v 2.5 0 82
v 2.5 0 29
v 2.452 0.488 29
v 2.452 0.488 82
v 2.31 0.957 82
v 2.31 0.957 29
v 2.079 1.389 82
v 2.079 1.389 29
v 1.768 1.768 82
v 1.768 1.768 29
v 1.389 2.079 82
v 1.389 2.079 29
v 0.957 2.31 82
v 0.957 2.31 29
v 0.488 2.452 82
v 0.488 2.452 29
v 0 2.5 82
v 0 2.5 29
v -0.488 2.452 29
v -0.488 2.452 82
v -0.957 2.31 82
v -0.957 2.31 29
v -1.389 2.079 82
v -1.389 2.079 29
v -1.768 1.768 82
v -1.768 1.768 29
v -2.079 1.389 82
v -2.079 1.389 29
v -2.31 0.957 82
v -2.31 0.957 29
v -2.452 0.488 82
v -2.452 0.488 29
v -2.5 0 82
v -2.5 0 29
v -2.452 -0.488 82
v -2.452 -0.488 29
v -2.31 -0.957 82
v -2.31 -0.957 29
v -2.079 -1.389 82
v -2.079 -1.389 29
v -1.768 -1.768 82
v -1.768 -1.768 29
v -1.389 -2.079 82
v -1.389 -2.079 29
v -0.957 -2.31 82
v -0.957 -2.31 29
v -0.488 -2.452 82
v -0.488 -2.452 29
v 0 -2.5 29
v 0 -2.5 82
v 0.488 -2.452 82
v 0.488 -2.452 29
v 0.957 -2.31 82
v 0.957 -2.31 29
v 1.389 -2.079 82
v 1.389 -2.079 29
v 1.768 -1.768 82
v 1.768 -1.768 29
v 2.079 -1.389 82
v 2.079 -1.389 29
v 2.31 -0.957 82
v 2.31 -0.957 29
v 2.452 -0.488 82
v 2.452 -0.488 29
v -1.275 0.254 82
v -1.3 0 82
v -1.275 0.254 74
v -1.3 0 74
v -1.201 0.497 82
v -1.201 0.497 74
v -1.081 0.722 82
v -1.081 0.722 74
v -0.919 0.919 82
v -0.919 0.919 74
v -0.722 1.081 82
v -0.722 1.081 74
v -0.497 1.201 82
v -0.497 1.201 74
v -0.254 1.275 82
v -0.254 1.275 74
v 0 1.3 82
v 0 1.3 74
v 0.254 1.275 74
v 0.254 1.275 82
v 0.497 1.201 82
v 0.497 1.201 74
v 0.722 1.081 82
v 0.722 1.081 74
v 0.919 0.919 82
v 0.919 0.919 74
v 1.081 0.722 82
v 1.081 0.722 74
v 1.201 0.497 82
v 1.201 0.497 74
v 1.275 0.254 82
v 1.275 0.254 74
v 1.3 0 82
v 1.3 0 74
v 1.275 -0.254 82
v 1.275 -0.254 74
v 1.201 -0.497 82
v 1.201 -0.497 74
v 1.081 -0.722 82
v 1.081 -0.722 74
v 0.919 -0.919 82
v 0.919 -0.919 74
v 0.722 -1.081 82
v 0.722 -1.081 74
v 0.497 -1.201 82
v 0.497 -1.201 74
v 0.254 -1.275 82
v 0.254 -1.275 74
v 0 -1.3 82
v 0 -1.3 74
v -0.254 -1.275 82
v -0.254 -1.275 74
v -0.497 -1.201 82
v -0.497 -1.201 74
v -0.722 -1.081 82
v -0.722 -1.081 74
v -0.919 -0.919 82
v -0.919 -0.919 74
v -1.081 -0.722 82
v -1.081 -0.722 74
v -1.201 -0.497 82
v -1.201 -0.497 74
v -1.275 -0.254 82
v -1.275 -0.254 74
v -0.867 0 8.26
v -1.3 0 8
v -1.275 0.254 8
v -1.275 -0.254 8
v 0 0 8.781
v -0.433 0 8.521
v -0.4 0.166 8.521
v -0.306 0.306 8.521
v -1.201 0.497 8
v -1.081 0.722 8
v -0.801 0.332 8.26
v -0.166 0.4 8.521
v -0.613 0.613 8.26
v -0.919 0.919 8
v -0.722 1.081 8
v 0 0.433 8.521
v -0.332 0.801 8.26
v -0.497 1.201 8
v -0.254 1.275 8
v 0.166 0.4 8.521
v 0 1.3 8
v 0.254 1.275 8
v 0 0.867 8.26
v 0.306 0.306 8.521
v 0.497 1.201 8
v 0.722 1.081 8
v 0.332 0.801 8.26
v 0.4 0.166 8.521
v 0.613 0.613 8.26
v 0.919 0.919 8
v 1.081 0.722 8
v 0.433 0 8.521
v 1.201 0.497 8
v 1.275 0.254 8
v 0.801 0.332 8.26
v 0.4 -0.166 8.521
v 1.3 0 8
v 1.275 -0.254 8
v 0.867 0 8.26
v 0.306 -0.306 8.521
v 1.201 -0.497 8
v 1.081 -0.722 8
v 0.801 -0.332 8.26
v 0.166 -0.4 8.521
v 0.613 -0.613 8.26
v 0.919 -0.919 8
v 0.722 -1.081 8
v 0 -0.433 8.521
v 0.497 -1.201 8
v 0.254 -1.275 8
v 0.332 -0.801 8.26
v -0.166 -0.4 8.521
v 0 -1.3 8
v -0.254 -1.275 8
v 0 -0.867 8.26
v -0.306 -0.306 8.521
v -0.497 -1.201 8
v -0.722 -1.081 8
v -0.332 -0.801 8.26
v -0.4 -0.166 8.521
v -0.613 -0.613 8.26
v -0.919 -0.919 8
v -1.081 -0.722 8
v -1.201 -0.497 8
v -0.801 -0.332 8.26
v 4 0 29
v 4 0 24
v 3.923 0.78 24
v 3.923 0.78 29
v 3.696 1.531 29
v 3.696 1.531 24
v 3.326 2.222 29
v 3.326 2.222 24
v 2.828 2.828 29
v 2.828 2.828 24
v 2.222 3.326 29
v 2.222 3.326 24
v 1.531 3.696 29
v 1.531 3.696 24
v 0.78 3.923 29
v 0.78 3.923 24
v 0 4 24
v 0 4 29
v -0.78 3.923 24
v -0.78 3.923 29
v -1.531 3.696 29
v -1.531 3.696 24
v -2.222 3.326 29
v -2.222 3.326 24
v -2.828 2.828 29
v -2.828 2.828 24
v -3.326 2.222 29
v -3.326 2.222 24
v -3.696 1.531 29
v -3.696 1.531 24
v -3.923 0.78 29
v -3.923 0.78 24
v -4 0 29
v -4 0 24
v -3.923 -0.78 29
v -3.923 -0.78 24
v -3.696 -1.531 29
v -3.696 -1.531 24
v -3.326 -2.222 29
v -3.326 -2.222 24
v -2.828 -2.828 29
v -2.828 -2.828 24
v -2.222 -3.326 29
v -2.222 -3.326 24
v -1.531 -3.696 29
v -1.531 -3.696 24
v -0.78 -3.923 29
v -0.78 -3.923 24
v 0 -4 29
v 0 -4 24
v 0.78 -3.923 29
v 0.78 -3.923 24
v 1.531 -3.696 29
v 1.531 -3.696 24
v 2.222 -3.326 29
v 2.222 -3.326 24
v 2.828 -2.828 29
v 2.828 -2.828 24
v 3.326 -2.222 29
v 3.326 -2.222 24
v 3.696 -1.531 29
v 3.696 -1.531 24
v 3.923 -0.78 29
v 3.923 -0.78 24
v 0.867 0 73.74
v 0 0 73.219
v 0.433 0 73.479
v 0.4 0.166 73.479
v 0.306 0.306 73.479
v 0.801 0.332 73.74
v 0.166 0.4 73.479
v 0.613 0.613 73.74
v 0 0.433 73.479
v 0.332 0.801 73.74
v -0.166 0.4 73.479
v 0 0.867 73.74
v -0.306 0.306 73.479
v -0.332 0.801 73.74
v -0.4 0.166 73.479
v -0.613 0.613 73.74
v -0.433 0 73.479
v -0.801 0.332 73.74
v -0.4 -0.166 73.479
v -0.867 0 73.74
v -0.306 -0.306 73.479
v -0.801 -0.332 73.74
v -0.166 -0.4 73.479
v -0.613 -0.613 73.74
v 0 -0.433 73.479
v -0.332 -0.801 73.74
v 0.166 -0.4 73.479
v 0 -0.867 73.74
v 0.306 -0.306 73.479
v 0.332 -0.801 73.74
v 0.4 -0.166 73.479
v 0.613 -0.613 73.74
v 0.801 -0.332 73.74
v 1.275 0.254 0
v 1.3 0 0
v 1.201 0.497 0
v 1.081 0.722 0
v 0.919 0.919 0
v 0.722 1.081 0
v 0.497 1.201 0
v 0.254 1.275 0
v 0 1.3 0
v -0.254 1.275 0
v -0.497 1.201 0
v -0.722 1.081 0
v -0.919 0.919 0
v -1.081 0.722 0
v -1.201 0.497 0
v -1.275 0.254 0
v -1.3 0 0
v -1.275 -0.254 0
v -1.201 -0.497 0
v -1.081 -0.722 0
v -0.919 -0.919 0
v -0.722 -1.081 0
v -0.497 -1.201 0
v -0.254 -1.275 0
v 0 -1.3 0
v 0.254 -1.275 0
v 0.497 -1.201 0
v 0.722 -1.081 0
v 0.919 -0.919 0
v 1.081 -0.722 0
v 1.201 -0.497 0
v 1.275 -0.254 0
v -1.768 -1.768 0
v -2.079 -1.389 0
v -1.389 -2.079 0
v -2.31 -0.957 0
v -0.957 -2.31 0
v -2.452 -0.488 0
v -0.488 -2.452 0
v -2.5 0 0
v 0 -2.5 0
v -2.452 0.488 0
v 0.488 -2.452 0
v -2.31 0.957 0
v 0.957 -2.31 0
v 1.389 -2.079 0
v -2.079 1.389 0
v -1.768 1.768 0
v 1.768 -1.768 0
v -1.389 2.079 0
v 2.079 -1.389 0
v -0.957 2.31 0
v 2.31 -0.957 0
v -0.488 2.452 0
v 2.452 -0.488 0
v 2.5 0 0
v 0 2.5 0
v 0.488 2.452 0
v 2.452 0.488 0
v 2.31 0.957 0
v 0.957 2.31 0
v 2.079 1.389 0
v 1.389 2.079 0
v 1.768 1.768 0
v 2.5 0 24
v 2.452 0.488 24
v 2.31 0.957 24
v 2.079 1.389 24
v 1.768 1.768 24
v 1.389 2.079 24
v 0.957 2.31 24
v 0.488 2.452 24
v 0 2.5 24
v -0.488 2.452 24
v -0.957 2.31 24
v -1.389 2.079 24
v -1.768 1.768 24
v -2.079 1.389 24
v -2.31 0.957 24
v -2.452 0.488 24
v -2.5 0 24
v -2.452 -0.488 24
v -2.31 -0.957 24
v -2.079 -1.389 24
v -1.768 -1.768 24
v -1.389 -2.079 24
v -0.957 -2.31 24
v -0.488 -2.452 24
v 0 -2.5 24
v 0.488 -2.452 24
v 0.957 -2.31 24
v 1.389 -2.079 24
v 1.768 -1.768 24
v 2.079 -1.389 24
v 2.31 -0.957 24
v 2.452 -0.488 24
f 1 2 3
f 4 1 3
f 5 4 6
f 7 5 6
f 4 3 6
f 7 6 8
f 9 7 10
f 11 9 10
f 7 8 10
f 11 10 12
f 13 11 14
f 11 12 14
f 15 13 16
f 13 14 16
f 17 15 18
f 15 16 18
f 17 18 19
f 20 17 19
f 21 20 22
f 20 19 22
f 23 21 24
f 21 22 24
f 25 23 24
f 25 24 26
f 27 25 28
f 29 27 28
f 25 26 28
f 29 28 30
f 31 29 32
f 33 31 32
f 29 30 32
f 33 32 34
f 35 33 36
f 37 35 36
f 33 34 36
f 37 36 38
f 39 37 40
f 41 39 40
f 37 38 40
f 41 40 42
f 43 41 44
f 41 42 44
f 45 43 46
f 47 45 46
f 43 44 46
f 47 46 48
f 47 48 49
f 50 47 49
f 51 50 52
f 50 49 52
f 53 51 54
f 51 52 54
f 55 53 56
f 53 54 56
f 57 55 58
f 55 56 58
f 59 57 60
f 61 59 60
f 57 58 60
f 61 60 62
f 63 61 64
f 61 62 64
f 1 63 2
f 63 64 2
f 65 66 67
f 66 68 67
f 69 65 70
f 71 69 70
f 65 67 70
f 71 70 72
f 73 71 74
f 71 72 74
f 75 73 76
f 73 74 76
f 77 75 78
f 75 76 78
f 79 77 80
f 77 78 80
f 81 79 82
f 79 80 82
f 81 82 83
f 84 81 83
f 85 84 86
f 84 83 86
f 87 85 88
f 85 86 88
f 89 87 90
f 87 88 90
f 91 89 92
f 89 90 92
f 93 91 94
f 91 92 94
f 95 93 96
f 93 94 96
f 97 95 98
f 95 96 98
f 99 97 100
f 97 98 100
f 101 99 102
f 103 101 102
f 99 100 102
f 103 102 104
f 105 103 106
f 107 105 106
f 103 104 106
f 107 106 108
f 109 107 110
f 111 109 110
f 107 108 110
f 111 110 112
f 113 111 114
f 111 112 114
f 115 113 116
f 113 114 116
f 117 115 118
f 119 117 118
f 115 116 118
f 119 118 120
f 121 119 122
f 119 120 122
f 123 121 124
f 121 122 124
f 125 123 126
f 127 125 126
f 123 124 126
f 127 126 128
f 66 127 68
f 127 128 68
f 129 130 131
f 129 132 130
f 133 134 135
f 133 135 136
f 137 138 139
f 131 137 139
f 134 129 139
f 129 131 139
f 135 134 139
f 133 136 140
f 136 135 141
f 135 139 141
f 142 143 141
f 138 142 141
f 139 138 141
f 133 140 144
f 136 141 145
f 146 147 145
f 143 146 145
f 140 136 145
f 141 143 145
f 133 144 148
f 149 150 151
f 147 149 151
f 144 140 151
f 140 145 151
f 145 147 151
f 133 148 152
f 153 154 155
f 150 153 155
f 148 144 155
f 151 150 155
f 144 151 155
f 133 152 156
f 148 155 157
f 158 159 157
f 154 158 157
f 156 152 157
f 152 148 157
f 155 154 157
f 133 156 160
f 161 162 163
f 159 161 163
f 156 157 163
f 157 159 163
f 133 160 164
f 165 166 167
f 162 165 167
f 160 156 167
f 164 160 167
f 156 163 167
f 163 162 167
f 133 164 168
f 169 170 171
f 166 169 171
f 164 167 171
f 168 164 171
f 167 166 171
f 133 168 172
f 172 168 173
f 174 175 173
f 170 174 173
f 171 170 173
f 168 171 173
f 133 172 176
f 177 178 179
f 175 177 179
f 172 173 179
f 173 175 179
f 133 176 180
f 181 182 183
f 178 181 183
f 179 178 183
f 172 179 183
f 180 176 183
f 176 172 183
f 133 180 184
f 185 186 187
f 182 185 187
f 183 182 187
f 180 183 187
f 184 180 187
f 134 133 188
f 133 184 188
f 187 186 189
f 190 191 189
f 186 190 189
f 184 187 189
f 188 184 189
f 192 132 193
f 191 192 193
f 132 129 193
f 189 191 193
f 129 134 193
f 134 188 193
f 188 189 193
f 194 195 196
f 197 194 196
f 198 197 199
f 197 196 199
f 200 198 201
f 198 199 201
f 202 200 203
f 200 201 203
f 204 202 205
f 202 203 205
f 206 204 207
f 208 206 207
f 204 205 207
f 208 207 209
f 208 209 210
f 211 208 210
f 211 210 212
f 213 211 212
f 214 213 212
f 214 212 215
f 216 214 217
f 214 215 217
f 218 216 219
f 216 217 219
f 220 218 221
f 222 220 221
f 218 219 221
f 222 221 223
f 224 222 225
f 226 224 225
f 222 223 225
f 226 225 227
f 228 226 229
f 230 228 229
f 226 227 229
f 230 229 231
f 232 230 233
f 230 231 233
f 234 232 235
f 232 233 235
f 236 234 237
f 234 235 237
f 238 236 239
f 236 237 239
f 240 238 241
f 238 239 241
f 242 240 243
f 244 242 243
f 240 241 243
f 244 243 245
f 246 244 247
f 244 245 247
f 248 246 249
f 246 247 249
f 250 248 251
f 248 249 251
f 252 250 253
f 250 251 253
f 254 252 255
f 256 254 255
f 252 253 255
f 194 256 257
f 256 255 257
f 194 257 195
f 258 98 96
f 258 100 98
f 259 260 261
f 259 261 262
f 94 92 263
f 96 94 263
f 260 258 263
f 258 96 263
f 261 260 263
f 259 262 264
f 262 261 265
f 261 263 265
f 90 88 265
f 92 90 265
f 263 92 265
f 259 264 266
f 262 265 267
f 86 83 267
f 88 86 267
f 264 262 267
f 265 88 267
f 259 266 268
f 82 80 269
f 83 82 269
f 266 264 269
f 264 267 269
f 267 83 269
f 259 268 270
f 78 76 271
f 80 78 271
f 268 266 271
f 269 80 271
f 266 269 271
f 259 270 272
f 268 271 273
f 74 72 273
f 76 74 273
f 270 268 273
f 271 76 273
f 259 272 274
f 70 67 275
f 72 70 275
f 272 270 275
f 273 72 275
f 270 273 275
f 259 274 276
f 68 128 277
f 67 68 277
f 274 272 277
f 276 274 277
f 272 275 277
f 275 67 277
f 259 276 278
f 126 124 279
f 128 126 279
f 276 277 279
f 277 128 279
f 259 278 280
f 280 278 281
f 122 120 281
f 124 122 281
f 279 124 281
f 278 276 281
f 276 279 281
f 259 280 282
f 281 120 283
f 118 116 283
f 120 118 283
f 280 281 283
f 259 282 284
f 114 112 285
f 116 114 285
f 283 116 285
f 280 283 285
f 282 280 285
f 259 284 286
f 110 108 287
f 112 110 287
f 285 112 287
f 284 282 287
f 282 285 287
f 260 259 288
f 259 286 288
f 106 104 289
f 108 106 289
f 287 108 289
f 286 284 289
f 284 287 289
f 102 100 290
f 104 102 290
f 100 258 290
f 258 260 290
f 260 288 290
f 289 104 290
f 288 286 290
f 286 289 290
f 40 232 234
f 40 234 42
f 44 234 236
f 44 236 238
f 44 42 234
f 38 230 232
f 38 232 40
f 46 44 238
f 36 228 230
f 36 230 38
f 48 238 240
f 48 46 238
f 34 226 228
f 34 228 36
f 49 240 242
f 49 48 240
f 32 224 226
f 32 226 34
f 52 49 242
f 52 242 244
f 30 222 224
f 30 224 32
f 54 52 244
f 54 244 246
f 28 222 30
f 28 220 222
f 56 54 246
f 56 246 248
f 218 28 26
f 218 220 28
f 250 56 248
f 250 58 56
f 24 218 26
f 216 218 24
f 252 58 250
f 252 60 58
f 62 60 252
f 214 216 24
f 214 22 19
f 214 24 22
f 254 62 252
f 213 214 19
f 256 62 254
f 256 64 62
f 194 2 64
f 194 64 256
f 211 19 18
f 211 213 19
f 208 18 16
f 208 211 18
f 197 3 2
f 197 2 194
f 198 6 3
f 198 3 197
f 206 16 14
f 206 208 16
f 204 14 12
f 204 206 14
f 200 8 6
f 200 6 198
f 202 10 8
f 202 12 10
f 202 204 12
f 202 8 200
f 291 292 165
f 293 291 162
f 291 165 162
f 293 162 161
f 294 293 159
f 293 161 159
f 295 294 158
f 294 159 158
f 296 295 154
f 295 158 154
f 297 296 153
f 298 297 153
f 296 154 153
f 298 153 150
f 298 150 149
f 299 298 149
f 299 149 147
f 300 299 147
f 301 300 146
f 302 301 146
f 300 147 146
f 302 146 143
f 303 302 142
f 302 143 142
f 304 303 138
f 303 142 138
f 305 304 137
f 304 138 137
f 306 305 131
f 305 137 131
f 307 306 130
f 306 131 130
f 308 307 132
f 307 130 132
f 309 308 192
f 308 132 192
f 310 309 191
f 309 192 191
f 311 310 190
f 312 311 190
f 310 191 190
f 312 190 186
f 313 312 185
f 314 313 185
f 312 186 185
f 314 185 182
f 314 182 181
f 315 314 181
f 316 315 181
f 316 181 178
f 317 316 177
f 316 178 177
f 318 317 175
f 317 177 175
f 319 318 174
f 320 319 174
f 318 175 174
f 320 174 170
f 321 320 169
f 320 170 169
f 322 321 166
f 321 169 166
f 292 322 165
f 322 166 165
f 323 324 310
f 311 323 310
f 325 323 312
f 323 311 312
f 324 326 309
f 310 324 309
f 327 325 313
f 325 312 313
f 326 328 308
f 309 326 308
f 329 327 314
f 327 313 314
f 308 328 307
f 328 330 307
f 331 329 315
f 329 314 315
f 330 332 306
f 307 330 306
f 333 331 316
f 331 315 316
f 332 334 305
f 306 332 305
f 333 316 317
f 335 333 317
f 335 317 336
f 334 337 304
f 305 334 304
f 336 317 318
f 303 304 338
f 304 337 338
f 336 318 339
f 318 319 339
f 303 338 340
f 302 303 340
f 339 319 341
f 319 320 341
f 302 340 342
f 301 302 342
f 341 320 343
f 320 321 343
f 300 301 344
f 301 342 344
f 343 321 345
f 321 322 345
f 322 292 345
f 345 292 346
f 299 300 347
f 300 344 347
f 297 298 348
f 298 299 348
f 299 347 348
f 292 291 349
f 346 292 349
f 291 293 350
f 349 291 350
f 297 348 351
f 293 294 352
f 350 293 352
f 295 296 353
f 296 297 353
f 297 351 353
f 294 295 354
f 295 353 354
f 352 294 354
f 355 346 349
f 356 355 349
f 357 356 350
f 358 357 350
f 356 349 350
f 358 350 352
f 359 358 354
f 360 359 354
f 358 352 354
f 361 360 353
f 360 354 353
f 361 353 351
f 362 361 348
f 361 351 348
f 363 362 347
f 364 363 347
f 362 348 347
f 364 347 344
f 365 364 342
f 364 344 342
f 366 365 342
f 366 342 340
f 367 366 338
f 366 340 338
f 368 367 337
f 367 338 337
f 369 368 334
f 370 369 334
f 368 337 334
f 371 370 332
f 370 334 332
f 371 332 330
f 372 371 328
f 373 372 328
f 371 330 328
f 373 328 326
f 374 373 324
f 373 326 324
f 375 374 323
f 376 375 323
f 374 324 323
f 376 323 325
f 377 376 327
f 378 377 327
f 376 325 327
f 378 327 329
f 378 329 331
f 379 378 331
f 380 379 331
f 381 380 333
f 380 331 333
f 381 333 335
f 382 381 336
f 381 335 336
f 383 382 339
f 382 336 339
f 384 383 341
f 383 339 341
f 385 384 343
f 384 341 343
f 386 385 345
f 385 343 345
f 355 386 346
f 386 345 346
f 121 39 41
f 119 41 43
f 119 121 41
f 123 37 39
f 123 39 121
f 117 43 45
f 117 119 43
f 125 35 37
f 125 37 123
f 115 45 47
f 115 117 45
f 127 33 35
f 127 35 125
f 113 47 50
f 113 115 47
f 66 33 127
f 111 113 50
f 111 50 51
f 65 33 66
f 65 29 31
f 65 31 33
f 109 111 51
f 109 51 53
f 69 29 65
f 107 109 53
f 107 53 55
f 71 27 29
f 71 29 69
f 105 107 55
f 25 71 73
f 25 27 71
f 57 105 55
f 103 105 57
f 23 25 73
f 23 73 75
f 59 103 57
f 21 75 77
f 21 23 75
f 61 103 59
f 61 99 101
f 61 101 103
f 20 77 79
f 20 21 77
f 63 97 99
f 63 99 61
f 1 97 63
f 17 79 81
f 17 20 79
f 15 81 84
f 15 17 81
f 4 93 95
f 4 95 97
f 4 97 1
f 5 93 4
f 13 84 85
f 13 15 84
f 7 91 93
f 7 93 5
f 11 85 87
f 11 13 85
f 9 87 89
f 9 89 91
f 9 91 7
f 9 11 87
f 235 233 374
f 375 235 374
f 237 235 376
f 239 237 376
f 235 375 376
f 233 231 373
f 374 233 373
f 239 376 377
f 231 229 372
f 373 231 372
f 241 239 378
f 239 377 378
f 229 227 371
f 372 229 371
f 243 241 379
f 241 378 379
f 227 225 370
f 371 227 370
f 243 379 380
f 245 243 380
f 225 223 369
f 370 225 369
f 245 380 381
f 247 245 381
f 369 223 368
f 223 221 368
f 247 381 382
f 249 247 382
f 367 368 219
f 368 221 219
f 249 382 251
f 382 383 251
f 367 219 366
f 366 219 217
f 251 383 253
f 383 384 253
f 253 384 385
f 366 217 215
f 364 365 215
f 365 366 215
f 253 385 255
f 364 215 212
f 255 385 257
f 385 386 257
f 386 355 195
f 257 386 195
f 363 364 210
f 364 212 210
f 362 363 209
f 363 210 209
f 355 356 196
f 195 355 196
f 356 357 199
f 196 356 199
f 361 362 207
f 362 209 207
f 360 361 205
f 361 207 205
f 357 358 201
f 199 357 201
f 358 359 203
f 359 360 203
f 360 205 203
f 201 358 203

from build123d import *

# Parameters (mm, degrees)
SKETCH1_R                 = 2.5
BOSS_EXTRUDE1_DEPTH       = 24
SKETCH2_R                 = 4
BOSS_EXTRUDE2_DEPTH       = 5
SKETCH3_R                 = 2.5
BOSS_EXTRUDE3_DEPTH       = 53
M3X0_5_TAPPED_HOLE1_D     = 2.6
M3X0_5_TAPPED_HOLE1_DEPTH = 8
M3X0_5_TAPPED_HOLE1_TIP   = 0.781118805
M3X0_5_TAPPED_HOLE2_D     = 2.6
M3X0_5_TAPPED_HOLE2_DEPTH = 8
M3X0_5_TAPPED_HOLE2_TIP   = 0.781118805


with BuildPart() as part:
    # Sketch1 → Boss-Extrude1 (new body)
    with BuildSketch(Plane.XY):
        Circle(SKETCH1_R)
    extrude(amount=BOSS_EXTRUDE1_DEPTH)

    # Sketch2 → Boss-Extrude2 (add)
    with BuildSketch(Plane.XY.offset(24)):
        Circle(SKETCH2_R)
    extrude(amount=BOSS_EXTRUDE2_DEPTH)

    # Sketch3 → Boss-Extrude3 (add)
    with BuildSketch(Plane.XY.offset(29)):
        Circle(SKETCH3_R)
    extrude(amount=BOSS_EXTRUDE3_DEPTH)

    # M3x0.5 Tapped Hole1
    with Locations(Plane.XY.offset(82)):
        with Locations((0, 0)):
            Hole(M3X0_5_TAPPED_HOLE1_D / 2, depth=M3X0_5_TAPPED_HOLE1_DEPTH)
            with Locations((0, 0, -(M3X0_5_TAPPED_HOLE1_DEPTH + M3X0_5_TAPPED_HOLE1_TIP / 2))):  # 118° drill point
                Cone(0, M3X0_5_TAPPED_HOLE1_D / 2, M3X0_5_TAPPED_HOLE1_TIP, mode=Mode.SUBTRACT)

    # M3x0.5 Tapped Hole2
    with Locations(Plane(origin=(0, 0, 0), x_dir=(-1, 0, 0), z_dir=(0, 0, -1))):
        with Locations((0, 0)):
            Hole(M3X0_5_TAPPED_HOLE2_D / 2, depth=M3X0_5_TAPPED_HOLE2_DEPTH)
            with Locations((0, 0, -(M3X0_5_TAPPED_HOLE2_DEPTH + M3X0_5_TAPPED_HOLE2_TIP / 2))):  # 118° drill point
                Cone(0, M3X0_5_TAPPED_HOLE2_D / 2, M3X0_5_TAPPED_HOLE2_TIP, mode=Mode.SUBTRACT)


solid = part.part
